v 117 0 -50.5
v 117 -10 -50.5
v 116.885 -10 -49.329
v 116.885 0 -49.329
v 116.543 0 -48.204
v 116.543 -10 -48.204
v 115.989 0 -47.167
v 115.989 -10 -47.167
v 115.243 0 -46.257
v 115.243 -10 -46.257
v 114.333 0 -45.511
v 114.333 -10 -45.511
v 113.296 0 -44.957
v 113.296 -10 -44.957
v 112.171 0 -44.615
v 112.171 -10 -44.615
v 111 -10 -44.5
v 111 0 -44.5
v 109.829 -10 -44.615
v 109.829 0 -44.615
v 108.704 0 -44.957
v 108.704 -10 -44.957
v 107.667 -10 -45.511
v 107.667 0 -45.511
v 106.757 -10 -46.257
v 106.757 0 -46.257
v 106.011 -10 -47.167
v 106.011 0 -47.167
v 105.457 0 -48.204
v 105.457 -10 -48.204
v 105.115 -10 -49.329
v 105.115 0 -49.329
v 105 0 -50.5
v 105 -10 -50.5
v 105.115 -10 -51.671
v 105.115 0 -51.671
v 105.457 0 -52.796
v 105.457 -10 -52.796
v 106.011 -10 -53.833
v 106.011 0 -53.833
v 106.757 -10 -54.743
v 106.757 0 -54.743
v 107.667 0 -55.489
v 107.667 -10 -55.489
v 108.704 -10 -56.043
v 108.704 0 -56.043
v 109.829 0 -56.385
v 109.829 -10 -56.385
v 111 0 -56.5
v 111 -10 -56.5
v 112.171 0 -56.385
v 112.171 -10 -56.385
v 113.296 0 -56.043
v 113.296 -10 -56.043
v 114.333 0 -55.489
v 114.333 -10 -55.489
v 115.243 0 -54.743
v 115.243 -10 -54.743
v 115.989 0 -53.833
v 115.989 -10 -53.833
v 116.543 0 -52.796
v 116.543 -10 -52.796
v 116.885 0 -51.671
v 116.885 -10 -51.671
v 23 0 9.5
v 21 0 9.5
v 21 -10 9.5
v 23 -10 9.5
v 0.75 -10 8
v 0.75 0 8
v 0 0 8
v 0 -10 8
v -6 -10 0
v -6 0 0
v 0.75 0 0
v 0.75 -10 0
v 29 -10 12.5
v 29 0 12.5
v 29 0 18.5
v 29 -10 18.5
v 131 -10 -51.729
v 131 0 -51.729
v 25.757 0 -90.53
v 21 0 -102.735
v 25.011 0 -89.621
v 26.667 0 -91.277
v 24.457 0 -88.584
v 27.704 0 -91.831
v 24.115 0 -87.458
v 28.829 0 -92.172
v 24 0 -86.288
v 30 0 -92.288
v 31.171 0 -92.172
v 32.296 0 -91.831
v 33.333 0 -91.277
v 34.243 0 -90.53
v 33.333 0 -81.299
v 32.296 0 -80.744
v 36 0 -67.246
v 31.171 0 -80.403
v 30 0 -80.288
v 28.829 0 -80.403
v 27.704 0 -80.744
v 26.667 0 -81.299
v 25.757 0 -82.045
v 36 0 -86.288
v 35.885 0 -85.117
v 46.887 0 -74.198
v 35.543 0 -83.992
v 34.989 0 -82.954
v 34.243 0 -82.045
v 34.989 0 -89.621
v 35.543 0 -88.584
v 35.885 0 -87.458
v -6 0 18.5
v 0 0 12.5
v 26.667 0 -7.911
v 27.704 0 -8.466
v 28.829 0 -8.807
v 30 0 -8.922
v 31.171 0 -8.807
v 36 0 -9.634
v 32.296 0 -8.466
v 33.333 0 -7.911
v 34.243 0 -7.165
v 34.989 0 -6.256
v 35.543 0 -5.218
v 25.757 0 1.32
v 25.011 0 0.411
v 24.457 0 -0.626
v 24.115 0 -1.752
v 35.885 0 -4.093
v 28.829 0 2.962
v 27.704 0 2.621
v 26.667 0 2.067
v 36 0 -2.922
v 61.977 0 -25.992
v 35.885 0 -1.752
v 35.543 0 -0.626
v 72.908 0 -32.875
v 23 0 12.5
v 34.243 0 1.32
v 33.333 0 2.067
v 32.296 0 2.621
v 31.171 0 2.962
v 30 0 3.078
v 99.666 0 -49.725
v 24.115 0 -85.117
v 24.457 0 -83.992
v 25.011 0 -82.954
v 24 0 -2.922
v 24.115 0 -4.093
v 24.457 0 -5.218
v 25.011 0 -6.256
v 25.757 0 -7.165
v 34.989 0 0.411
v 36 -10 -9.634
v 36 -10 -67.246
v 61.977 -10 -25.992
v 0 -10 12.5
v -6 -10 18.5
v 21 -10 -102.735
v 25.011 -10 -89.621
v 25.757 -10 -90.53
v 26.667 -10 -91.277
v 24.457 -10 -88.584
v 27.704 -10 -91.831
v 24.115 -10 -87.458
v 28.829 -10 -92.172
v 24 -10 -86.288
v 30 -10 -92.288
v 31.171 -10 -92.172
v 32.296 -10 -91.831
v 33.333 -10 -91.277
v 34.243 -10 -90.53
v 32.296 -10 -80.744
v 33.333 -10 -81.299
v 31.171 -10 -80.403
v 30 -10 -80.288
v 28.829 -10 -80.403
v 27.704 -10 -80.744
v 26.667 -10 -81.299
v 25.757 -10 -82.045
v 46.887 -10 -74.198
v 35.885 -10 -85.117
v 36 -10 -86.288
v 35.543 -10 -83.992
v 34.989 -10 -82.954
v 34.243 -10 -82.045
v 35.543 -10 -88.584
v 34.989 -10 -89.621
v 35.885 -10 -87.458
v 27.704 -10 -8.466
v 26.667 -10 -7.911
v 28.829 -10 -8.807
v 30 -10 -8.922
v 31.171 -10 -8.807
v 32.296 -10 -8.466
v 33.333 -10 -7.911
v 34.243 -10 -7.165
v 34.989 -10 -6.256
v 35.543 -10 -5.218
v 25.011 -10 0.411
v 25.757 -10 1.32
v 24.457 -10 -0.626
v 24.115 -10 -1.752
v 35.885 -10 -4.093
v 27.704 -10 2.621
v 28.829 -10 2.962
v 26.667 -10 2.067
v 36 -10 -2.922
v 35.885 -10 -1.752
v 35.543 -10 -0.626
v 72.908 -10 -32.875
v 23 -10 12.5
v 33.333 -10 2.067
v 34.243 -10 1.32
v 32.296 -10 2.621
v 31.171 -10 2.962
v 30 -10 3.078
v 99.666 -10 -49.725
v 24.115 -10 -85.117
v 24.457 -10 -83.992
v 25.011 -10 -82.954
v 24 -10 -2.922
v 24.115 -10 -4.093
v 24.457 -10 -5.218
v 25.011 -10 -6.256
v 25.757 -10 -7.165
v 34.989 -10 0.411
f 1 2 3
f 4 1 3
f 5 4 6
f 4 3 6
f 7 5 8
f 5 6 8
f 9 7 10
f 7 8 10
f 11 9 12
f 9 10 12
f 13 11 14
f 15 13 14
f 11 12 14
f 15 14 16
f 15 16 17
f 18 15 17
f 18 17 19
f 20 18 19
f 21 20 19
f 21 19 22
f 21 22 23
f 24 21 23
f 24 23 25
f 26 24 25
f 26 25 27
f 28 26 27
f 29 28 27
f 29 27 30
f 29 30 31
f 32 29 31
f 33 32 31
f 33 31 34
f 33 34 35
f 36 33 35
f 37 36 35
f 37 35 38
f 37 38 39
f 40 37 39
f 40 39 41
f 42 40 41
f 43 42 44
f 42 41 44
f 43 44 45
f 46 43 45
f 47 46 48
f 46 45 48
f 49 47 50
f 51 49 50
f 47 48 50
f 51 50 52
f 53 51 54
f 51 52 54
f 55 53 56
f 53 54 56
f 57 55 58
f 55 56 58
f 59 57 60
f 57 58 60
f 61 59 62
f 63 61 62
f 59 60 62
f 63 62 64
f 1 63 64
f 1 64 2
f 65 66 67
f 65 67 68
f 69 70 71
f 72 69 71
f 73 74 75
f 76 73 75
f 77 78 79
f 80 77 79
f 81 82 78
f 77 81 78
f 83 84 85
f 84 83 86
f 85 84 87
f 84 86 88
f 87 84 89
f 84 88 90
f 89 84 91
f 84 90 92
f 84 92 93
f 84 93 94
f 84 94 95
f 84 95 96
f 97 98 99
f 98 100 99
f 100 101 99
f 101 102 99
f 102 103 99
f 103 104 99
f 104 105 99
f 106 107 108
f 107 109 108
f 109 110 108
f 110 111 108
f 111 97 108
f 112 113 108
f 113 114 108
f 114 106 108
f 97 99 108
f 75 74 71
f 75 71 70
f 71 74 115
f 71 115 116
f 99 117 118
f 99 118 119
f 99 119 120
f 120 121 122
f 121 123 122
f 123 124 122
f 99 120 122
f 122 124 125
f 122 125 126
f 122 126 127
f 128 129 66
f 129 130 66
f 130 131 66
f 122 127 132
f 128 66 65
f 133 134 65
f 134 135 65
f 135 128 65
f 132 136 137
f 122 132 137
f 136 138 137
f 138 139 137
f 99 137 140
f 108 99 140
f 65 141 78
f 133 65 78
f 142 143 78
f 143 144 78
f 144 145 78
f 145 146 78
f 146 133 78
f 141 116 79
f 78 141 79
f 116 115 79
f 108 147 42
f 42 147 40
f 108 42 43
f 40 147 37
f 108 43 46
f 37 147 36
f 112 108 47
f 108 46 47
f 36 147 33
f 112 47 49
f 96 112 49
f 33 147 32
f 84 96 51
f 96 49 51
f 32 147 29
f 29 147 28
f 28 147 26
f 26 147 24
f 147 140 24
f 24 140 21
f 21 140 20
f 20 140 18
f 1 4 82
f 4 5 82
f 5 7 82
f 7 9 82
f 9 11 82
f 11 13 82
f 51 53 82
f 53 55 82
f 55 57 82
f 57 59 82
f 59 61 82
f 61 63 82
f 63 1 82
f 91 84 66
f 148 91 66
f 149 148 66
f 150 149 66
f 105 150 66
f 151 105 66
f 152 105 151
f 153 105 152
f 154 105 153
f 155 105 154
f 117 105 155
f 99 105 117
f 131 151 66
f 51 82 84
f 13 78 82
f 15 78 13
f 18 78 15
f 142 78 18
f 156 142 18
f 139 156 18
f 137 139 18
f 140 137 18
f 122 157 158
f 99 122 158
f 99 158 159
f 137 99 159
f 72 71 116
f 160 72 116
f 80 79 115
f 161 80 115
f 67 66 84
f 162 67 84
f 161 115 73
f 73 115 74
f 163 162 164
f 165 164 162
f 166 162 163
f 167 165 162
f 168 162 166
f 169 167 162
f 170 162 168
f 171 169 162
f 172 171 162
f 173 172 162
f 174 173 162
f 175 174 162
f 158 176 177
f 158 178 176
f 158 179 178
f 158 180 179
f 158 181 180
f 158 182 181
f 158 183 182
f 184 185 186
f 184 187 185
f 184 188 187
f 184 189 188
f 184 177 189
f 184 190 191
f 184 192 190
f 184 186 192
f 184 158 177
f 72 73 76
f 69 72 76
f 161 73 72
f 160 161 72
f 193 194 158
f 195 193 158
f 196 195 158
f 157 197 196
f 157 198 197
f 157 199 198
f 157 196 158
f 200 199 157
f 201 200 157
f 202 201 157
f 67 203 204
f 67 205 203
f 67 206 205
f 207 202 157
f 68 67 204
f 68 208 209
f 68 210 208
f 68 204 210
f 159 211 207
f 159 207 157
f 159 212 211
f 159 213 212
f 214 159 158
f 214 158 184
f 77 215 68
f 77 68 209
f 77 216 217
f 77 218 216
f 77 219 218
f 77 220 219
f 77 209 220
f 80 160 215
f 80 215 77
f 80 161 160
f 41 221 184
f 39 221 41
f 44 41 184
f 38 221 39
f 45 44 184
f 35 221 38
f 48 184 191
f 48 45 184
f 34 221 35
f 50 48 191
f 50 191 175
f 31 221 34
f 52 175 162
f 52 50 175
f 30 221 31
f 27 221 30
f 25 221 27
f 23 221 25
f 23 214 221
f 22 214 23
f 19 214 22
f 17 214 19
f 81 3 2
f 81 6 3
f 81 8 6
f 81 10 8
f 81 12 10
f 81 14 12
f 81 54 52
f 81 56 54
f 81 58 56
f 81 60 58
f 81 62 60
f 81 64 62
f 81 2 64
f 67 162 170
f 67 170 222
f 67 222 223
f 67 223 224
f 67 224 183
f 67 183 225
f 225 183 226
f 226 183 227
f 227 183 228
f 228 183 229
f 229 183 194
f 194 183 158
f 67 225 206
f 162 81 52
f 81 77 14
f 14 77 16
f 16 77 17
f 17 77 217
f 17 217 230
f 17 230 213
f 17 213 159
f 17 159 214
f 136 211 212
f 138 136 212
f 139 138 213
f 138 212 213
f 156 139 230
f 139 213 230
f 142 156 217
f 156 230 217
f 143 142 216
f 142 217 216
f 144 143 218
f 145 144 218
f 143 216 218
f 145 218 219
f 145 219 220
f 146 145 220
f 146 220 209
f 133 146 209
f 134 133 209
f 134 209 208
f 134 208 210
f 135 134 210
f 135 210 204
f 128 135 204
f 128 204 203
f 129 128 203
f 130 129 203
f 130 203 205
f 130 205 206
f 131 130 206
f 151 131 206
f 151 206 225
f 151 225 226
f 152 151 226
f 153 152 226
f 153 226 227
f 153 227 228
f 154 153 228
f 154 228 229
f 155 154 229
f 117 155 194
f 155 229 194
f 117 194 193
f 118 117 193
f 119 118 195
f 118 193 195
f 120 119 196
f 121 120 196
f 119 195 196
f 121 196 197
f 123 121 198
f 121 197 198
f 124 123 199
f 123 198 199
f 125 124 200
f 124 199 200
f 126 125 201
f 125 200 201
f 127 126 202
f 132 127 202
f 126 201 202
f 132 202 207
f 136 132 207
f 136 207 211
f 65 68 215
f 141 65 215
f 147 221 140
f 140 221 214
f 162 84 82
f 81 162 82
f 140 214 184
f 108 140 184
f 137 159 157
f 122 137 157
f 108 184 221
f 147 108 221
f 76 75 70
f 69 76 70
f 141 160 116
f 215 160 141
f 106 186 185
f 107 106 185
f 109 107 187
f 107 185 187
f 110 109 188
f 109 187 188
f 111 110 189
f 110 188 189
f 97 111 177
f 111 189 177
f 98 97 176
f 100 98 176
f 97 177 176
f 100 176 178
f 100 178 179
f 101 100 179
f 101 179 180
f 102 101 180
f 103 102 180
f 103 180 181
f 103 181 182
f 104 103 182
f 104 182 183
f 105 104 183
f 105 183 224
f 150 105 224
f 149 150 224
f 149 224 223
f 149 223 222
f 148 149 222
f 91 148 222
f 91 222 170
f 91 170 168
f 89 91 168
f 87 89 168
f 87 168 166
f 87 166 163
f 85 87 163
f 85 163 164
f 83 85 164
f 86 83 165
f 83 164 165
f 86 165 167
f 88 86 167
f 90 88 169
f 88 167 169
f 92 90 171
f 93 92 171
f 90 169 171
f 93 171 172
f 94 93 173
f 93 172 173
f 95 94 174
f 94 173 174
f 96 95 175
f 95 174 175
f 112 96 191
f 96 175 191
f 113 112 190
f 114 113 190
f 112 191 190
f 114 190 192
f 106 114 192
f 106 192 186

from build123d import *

# Parameters (mm, degrees)
F1_DEPTH = 10
F3_DEPTH = 25
F4_R     = 6
F5_DEPTH = 25
F6_W     = 2
F6_H     = 3
F7_DEPTH = 25


with BuildPart() as f1:
    # F0 (on Front) → F1 (new body)
    with BuildSketch(Plane.XZ):
        Polygon((-6, 0), (0, 0), (0, 8), (0, 12.5), (21, 12.5), (21, -102.735072), (131, -51.729484), (29, 12.5), (29, 18.5), (-6, 18.5), align=None)
        Polygon((0, 8), (0, 0), (0.75, 0), (0.75, 6.25), (0.75, 8), align=None)
    extrude(amount=F1_DEPTH)

    # F2 (on face) → F3 (cut)
    with BuildSketch(Plane.XZ.offset(10)):
        Polygon((61.977412, -25.99209), (36, -9.634093), (36, -67.245669), align=None)
        Polygon((99.665942, -49.724589), (72.907623, -32.874853), (46.886595, -74.197695), align=None)
    extrude(amount=-F3_DEPTH, mode=Mode.SUBTRACT)

    # F4 (on face) → F5 (cut)
    with BuildSketch(Plane.XZ.offset(10)):
        with Locations((30, -2.922298)):
            Circle(F4_R)
        with Locations((111, -50.5)):
            Circle(F4_R)
        with Locations((30, -86.28769)):
            Circle(F4_R)
    extrude(amount=-F5_DEPTH, mode=Mode.SUBTRACT)

    # F6 (on face) → F7 (cut)
    with BuildSketch(Plane.XZ.offset(10)):
        with Locations((22, 11)):
            Rectangle(F6_W, F6_H)
    extrude(amount=-F7_DEPTH, mode=Mode.SUBTRACT)


solid = f1.part
